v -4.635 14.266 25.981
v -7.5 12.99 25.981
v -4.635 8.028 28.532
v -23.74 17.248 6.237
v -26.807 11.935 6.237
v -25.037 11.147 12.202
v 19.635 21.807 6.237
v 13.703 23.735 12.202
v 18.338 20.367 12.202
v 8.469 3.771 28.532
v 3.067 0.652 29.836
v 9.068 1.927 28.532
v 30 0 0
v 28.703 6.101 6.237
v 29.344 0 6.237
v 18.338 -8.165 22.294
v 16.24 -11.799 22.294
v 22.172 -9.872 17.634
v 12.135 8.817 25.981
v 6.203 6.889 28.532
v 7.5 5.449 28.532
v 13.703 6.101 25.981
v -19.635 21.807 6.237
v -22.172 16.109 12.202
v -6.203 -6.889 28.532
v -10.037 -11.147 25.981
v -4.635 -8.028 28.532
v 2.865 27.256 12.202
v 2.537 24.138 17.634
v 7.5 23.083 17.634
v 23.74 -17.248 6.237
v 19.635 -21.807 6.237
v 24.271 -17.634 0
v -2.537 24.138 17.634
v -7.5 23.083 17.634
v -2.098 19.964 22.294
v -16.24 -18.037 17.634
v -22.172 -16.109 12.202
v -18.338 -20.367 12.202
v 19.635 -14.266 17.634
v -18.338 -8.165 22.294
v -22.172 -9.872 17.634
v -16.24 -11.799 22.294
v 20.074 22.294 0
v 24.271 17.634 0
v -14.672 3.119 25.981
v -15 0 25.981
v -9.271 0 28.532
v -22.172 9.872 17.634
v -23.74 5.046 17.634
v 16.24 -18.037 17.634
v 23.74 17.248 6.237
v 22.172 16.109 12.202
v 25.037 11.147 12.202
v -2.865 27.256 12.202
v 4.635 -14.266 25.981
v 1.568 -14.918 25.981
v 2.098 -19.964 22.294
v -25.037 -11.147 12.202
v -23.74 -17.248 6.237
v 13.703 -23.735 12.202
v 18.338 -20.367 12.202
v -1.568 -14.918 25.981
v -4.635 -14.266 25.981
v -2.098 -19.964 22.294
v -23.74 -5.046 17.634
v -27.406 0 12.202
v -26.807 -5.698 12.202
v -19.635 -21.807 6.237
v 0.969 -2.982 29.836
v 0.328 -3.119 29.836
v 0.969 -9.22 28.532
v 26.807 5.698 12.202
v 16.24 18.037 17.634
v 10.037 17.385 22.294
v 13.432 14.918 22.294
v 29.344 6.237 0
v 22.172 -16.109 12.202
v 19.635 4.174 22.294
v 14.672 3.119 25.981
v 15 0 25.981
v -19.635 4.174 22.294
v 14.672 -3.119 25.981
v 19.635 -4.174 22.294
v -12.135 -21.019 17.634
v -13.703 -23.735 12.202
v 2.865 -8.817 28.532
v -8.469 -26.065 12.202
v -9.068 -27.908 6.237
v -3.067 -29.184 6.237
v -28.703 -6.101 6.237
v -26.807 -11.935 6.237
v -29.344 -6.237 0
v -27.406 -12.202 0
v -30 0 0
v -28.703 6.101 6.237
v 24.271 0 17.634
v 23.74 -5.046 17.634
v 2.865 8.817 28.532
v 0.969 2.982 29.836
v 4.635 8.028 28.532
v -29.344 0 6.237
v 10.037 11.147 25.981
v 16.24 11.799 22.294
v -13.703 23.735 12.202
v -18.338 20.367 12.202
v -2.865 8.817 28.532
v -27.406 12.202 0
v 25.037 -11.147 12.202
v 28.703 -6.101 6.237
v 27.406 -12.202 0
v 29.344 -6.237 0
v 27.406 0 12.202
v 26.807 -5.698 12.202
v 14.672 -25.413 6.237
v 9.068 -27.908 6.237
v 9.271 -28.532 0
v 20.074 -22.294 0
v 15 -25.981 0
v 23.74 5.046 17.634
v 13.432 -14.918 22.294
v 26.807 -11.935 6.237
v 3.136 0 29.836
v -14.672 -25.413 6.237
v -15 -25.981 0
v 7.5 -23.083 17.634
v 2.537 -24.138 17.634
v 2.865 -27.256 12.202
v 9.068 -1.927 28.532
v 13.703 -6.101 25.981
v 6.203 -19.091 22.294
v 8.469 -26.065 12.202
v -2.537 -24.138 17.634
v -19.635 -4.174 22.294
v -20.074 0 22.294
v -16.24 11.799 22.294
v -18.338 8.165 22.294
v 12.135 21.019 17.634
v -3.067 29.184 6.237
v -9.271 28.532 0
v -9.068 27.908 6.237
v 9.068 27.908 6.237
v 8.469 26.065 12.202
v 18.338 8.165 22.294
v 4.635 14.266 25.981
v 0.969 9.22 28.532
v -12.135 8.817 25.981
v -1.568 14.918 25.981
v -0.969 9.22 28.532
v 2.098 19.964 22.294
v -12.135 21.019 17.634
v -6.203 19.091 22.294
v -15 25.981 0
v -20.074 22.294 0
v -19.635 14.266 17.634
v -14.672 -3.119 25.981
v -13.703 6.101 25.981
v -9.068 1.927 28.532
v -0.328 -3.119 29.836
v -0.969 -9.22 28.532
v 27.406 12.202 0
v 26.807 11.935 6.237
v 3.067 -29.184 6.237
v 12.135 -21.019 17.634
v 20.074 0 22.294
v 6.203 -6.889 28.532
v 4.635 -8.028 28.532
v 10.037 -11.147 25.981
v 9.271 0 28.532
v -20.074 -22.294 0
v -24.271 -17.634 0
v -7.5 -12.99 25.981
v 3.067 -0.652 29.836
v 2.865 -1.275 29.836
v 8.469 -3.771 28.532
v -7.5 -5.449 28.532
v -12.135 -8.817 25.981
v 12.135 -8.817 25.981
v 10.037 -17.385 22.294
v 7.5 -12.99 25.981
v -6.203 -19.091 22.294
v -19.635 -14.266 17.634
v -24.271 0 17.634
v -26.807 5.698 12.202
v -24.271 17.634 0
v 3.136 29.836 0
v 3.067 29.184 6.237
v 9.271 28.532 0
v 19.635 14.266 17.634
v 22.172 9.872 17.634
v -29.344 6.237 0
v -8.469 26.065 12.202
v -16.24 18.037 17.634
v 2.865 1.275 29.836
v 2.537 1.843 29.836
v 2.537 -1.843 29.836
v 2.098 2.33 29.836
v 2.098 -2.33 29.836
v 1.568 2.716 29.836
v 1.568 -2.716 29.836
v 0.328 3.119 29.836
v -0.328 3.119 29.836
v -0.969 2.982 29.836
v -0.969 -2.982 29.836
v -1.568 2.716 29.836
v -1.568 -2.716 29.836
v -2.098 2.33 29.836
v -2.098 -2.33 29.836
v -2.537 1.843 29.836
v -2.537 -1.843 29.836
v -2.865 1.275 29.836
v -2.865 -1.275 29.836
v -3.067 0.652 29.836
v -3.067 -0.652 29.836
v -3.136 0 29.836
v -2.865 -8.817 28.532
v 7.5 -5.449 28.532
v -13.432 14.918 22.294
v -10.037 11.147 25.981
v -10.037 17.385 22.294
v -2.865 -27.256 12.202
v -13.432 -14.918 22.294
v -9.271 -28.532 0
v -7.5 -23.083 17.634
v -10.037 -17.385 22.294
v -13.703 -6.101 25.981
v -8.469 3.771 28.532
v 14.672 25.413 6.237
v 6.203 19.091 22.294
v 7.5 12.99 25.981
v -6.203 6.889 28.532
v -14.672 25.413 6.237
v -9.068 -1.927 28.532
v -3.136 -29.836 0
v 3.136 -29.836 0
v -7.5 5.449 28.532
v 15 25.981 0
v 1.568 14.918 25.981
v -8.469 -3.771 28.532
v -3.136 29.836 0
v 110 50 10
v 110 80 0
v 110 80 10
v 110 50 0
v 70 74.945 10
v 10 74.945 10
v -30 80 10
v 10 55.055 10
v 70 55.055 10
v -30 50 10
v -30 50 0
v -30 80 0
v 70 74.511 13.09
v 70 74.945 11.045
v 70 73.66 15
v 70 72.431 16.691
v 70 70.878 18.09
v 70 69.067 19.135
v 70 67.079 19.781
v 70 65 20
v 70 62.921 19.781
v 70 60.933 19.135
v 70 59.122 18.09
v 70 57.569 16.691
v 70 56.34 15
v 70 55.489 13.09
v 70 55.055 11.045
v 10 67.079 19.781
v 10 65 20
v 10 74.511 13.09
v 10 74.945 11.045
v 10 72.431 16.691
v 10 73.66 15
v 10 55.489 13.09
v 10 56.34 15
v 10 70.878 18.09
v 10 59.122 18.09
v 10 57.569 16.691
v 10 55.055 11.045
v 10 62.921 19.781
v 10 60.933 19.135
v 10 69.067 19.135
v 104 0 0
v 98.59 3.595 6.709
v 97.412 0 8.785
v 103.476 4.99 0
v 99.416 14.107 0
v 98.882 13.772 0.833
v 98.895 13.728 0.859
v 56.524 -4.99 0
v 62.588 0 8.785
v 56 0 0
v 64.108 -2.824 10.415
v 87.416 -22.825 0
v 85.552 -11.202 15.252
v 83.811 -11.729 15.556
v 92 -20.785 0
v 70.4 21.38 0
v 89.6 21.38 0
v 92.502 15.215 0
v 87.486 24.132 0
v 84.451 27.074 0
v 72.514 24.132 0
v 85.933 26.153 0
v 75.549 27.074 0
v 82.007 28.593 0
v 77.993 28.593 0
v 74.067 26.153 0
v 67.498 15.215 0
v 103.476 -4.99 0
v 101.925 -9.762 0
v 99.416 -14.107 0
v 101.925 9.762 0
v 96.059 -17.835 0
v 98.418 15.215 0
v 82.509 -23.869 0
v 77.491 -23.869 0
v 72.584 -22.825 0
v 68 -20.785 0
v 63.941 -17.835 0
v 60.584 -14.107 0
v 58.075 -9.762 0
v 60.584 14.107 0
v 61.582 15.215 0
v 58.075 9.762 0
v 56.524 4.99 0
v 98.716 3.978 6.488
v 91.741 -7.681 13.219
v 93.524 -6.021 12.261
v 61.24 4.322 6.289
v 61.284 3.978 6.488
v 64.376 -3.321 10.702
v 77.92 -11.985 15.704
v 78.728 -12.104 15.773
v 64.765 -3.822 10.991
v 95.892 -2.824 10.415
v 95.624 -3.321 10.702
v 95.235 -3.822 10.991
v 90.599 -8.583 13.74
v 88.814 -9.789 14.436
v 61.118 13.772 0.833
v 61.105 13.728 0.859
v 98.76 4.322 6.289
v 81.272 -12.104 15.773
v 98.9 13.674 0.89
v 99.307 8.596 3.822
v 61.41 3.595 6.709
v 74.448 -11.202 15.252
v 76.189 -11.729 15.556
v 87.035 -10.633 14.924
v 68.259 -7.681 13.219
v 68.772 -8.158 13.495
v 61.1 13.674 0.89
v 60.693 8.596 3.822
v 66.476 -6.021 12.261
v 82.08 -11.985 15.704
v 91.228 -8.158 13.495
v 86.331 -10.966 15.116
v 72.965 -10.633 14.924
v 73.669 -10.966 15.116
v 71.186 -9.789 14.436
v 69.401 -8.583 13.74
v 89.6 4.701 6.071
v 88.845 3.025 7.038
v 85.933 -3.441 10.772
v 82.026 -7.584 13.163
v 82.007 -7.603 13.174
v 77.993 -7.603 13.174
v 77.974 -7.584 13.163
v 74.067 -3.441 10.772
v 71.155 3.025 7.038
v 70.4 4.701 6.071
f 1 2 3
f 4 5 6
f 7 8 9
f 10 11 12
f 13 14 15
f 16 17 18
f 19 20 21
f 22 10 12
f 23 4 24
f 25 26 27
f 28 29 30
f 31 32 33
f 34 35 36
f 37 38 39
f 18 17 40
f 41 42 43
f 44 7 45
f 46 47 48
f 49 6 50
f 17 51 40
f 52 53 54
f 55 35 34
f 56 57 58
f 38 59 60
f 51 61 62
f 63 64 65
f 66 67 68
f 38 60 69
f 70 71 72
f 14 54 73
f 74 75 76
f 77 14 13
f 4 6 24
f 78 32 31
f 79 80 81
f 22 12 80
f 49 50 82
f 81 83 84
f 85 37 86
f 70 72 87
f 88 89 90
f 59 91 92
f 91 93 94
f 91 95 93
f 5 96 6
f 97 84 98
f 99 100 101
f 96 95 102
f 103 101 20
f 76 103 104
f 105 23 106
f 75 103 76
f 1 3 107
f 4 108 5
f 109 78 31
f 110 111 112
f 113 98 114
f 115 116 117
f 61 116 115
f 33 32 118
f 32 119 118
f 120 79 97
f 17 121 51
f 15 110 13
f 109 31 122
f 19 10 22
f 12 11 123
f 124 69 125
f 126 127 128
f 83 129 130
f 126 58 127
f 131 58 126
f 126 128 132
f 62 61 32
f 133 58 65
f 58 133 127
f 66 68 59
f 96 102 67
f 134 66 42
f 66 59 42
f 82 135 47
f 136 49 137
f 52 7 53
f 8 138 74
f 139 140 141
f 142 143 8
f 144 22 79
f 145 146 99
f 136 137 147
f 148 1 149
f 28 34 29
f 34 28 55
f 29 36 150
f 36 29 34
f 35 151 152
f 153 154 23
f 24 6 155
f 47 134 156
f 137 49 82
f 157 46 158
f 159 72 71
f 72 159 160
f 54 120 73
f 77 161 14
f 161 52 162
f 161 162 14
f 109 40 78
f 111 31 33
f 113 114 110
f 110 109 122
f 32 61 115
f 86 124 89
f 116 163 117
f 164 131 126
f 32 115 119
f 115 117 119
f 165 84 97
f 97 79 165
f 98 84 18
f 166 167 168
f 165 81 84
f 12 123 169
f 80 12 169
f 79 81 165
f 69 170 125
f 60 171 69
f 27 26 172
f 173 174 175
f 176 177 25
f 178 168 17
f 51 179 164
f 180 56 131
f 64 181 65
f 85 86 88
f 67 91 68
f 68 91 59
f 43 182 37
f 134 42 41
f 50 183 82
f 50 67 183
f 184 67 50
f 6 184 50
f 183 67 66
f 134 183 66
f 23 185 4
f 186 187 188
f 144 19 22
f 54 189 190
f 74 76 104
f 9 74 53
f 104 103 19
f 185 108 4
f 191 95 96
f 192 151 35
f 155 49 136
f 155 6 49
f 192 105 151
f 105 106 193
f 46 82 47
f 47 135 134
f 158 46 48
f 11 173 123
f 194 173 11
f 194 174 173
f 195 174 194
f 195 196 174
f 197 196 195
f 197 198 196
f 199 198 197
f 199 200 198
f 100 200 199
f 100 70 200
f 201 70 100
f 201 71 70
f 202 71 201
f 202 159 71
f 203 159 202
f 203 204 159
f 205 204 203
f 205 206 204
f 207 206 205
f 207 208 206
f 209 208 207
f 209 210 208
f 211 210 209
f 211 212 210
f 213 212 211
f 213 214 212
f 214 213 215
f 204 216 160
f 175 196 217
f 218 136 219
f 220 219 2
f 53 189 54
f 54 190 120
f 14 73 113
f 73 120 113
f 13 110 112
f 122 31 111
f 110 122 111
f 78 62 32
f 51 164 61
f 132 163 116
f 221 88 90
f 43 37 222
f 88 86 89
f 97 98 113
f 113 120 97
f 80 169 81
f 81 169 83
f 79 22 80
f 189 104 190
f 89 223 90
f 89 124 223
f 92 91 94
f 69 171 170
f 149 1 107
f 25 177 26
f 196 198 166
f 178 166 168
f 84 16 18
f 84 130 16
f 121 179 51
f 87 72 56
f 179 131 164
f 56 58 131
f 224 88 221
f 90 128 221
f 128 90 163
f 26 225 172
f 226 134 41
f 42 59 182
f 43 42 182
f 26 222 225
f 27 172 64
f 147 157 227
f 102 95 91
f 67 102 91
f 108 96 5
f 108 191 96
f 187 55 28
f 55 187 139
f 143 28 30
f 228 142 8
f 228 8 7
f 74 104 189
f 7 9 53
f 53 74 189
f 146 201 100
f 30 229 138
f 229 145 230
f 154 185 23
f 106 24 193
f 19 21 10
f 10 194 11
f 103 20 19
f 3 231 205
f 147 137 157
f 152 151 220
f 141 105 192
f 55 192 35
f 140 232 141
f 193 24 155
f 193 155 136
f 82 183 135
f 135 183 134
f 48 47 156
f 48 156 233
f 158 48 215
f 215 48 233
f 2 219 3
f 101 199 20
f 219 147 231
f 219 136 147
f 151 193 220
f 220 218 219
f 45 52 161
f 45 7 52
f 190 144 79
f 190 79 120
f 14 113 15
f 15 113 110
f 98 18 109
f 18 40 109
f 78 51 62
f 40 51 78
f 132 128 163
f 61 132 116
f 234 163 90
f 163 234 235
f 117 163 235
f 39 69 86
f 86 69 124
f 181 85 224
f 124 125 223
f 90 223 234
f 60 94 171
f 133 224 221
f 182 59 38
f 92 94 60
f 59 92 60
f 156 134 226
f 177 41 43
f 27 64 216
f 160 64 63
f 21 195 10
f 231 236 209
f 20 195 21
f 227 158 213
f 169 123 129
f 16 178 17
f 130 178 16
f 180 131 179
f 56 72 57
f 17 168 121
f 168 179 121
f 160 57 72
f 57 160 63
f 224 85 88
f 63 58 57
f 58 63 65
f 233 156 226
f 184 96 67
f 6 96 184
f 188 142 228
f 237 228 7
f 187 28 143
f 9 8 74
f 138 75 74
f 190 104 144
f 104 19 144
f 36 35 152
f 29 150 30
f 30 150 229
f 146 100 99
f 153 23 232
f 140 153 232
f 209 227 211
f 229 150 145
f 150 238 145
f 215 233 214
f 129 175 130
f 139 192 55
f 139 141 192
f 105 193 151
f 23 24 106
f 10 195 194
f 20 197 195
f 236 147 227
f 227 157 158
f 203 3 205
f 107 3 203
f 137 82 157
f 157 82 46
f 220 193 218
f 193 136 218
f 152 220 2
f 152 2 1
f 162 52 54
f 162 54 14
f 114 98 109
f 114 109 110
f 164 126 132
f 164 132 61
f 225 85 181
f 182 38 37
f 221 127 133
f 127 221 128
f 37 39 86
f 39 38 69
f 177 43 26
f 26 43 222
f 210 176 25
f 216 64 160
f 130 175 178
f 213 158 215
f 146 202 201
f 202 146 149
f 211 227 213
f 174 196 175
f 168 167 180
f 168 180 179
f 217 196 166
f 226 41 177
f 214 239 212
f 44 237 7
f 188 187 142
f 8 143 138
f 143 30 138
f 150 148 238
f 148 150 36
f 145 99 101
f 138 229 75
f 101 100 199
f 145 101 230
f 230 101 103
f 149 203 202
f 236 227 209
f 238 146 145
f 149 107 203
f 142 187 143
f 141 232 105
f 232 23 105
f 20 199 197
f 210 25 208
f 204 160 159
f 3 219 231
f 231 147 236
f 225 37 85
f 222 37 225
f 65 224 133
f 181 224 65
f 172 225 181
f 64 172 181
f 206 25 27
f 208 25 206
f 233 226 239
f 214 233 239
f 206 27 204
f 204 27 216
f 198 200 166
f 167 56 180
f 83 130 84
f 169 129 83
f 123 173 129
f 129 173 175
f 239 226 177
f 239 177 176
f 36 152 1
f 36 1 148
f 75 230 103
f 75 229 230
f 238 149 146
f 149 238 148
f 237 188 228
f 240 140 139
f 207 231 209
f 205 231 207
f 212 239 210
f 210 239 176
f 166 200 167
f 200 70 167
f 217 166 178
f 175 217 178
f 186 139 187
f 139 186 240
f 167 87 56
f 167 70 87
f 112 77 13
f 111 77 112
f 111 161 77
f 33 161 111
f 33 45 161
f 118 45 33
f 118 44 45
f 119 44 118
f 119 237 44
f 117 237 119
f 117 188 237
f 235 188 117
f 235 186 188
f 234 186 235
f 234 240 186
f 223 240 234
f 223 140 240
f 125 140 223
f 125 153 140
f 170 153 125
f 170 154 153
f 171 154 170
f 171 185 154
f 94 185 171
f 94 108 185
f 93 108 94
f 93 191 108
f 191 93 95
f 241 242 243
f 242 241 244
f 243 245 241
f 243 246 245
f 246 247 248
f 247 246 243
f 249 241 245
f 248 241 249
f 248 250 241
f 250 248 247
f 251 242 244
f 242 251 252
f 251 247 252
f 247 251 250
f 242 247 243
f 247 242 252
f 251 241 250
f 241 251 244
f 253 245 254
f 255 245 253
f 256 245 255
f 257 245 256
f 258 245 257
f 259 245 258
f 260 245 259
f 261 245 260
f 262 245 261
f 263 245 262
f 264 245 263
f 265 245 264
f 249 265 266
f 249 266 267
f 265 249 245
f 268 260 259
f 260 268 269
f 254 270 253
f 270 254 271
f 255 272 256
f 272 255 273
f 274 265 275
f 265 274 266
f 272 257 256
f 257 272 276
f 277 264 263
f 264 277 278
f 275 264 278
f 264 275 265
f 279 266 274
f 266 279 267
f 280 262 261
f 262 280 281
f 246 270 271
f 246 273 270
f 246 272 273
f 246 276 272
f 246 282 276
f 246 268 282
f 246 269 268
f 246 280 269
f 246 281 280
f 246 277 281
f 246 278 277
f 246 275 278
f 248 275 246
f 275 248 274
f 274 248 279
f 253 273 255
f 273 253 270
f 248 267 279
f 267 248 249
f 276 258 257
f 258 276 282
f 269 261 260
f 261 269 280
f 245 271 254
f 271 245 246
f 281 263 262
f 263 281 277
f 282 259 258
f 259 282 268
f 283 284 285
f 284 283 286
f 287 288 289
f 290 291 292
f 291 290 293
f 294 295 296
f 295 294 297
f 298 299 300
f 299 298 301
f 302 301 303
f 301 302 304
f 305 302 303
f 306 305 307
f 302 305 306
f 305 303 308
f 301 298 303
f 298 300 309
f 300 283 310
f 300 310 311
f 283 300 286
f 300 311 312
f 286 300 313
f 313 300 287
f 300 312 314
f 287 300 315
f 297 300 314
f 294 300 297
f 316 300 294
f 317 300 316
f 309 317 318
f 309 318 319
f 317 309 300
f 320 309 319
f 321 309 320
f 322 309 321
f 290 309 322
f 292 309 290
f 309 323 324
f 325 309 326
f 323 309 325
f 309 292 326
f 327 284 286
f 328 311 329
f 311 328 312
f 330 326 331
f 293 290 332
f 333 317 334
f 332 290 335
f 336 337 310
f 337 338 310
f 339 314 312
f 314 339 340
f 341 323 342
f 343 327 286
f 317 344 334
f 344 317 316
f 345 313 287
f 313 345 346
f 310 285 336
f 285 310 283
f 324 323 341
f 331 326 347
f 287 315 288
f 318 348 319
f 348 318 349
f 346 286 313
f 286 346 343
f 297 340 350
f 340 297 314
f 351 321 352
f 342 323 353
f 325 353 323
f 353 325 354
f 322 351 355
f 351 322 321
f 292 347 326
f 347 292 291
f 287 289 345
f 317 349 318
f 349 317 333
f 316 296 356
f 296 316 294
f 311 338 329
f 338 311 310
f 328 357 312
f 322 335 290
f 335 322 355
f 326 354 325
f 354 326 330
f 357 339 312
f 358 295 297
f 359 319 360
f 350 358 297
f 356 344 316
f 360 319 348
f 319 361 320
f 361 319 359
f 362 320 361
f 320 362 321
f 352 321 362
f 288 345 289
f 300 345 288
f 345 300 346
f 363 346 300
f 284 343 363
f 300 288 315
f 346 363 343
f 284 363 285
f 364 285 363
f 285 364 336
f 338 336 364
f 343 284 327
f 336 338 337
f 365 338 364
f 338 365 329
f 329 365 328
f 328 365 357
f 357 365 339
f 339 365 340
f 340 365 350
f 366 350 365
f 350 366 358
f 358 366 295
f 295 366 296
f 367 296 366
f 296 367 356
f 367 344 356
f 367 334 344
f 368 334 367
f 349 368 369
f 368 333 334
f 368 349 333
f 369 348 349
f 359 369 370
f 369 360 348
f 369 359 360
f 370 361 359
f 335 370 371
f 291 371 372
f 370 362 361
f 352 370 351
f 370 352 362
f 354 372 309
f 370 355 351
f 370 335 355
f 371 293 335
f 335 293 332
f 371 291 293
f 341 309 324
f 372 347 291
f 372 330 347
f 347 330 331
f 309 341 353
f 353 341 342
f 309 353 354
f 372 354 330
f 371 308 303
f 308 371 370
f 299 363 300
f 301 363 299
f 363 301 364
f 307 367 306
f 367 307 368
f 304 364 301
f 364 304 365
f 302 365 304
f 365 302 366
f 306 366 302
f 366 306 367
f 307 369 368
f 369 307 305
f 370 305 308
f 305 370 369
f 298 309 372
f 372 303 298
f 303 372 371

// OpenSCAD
difference() {
	sphere(r=30);
	translate([-50, -50, -100]) cube([100, 100, 100]);
}

translate([-30, 50, 0]) union() {
	cube([140, 30, 10]);
	translate([40, 15, 10]) rotate([0, 90, 0]) cylinder(r=10, h=60);
}

translate([80, 0, 0]) scale(1.2) union() {
	difference() {
		cylinder(r1=20, r2=5, h=20);
		translate([-25, 30, -10]) rotate([60, 0, 0]) cube([50, 50, 50]);
	}
	difference() {
		translate([0, 35, -21]) rotate([70, 0, 0]) cylinder(r=16, h=50);
		translate([-50, -50, -100]) cube([100, 100, 100]);
	}
}
